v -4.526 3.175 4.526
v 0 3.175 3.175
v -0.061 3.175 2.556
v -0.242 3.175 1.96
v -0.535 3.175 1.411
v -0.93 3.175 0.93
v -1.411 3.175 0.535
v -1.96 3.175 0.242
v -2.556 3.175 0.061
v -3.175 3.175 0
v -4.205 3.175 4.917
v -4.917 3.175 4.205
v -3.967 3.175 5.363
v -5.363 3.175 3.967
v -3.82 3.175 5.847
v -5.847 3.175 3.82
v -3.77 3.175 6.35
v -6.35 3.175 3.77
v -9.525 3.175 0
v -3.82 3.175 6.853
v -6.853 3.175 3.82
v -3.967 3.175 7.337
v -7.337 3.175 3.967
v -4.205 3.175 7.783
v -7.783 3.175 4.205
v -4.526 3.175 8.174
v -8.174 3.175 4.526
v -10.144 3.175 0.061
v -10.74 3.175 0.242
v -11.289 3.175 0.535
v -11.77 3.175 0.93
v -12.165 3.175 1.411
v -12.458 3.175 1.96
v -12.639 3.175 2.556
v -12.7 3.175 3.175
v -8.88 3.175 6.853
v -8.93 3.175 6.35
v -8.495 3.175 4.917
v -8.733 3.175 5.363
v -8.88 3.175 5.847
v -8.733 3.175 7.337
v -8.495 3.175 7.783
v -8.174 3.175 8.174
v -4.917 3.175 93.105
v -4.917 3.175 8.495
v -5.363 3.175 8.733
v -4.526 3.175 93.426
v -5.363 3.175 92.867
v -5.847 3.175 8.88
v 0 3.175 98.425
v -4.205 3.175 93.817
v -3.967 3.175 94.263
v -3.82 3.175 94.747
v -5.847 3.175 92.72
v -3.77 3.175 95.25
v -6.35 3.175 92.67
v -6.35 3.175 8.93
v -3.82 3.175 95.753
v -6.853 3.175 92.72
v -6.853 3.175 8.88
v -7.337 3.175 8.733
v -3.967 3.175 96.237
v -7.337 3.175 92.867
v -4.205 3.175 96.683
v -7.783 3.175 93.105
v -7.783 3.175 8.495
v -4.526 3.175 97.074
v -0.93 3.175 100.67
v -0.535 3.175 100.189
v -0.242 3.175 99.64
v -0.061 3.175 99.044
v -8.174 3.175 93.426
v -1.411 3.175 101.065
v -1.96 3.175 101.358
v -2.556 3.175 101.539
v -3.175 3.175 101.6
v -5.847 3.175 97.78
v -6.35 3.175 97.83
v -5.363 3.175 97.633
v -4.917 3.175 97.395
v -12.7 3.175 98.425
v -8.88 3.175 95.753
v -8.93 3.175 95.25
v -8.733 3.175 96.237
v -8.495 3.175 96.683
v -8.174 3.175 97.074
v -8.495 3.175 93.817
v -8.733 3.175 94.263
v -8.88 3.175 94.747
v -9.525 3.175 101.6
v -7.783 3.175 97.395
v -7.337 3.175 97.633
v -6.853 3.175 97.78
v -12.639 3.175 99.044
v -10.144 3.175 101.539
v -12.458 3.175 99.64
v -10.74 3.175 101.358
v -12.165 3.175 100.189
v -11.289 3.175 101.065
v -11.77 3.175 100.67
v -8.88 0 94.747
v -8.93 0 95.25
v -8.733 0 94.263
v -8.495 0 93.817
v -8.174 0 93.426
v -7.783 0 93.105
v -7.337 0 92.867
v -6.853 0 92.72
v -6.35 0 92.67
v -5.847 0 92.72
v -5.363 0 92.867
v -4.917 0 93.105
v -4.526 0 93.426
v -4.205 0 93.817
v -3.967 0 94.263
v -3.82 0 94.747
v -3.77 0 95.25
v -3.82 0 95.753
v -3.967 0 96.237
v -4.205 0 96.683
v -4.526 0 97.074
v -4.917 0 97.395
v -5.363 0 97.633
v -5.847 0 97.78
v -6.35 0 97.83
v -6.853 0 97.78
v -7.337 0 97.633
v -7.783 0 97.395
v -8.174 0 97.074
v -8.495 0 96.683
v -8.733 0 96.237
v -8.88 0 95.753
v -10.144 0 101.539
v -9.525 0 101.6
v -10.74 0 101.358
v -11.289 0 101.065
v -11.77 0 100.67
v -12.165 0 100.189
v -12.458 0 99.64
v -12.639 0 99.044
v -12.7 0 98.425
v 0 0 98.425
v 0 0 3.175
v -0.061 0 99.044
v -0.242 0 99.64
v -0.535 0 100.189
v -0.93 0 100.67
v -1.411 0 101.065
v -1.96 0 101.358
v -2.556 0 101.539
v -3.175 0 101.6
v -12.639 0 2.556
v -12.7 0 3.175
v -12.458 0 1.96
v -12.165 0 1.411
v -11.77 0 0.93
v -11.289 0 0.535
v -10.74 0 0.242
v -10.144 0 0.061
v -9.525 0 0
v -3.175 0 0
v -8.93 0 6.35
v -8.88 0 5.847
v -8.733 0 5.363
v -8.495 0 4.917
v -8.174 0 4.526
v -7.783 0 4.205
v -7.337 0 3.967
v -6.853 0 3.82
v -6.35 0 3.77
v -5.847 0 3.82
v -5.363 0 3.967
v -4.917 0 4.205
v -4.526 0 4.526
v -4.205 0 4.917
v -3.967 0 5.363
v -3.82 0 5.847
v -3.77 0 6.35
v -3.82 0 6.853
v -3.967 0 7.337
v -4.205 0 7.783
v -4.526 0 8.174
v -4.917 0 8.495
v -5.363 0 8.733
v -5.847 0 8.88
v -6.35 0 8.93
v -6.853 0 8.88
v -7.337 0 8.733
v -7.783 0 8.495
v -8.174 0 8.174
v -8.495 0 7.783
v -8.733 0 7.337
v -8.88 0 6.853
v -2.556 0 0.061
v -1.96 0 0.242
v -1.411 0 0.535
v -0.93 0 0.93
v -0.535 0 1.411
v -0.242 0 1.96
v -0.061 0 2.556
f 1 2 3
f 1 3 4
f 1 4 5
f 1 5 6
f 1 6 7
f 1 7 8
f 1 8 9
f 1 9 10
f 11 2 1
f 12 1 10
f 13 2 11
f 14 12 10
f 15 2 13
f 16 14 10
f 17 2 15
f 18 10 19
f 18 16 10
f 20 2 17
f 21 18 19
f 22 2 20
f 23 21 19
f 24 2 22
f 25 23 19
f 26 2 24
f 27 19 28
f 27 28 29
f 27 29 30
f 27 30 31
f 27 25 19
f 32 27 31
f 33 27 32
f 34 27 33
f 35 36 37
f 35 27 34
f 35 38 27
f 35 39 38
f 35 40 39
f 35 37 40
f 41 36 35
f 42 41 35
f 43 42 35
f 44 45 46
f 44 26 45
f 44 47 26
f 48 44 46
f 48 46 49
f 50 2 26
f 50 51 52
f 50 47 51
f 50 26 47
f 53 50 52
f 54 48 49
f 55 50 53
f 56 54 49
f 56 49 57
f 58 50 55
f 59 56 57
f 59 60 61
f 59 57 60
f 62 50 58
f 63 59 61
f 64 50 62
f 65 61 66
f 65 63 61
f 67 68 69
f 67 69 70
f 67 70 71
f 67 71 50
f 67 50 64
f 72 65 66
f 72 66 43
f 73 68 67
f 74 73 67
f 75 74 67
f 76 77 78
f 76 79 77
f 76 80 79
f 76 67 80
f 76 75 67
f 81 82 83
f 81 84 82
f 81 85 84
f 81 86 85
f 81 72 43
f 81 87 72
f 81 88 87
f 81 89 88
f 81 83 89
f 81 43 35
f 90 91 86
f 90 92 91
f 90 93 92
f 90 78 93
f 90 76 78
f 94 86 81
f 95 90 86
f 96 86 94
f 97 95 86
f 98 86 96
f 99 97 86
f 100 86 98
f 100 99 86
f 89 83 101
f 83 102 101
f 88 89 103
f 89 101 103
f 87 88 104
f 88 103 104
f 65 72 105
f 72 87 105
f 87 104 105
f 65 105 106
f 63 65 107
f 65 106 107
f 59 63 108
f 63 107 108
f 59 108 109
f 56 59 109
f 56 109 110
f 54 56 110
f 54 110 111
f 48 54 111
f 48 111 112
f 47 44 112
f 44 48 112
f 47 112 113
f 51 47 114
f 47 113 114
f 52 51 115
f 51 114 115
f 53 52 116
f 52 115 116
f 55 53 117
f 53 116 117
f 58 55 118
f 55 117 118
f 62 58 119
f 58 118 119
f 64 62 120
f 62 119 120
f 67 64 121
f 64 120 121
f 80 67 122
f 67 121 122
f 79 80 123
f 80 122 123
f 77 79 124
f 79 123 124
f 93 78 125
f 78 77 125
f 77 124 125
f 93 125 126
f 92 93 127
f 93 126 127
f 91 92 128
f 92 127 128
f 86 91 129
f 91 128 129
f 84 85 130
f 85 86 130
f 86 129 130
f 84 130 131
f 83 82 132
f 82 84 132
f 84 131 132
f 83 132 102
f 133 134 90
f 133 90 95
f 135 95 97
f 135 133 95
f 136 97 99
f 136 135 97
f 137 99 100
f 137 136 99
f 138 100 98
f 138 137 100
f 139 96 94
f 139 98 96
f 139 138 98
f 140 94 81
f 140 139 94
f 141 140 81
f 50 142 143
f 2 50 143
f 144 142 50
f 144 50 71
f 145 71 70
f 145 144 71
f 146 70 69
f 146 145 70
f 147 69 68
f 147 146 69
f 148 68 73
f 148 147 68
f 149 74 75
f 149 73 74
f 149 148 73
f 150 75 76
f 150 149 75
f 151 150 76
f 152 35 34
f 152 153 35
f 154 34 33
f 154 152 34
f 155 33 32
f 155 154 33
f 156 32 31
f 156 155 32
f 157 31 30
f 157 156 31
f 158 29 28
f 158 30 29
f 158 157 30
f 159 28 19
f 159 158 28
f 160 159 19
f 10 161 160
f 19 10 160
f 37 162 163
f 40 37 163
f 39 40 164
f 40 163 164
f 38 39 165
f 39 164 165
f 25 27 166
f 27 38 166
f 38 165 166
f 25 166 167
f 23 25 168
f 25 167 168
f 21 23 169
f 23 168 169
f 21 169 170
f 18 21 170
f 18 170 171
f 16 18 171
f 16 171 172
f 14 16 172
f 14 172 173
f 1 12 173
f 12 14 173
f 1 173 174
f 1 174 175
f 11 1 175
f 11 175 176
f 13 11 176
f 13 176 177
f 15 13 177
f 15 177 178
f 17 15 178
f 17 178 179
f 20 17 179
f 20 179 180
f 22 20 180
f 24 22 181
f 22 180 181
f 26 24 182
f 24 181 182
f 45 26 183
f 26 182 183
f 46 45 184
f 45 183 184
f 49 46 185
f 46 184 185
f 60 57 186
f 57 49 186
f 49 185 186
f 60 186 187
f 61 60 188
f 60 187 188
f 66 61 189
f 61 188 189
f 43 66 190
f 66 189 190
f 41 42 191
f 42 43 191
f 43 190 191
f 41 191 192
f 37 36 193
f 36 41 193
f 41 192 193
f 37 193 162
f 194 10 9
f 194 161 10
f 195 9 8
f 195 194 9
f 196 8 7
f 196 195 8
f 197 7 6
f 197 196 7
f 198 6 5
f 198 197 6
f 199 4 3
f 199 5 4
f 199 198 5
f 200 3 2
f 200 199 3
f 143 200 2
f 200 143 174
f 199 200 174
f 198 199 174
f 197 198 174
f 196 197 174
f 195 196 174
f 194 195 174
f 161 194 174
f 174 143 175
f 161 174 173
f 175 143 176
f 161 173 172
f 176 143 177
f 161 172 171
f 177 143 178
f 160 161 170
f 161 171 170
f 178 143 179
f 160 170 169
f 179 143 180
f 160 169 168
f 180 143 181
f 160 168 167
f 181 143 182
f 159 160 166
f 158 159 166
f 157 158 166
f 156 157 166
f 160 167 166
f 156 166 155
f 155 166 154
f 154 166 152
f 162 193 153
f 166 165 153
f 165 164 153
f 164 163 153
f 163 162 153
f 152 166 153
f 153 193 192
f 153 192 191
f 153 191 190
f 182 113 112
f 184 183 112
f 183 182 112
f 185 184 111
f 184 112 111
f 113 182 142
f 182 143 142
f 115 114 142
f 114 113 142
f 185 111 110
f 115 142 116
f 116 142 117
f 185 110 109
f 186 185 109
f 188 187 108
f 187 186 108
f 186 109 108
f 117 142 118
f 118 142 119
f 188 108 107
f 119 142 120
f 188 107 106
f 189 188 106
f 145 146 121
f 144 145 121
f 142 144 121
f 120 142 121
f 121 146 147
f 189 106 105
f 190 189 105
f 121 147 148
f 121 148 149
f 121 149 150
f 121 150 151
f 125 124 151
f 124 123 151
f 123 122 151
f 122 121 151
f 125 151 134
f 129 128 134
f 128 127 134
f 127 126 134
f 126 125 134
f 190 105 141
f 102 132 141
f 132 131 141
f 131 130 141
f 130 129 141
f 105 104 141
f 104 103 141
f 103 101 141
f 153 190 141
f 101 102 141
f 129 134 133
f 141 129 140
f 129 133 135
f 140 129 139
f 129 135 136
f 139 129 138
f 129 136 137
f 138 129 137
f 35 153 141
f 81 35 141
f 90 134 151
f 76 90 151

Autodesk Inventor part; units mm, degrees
ref_plane "YZ Plane" through (0, 0, 0) normal (1, 0, 0) x (0, 1, 0)
ref_plane "XZ Plane" through (0, 0, 0) normal (0, 1, 0) x (-1, 0, 0)
ref_plane "XY Plane" through (0, 0, 0) normal (0, 0, 1) x (1, 0, 0)
sketch "Sketch1" plane through (0, 0, 0) normal (0, 1, 0) x (-1, 0, 0)
  line L0 (3.175, 0) -> (9.525, 0)
  line L1 (12.7, 3.175) -> (12.7, 98.425)
  line L2 (9.525, 101.6) -> (3.175, 101.6)
  line L3 (0, 98.425) -> (0, 3.175)
  circle A0 centre (6.35, 95.25) radius 2.5797
  circle A1 centre (6.35, 6.35) radius 2.5797
  arc A2 (12.7, 98.425) -> (9.525, 101.6) centre (9.525, 98.425) ccw
  arc A3 (3.175, 101.6) -> (0, 98.425) centre (3.175, 98.425) ccw
  arc A4 (0, 3.175) -> (3.175, 0) centre (3.175, 3.175) ccw
  arc A5 (9.525, 0) -> (12.7, 3.175) centre (9.525, 3.175) ccw
  point P0 (0, 0)
  point P1 (12.7, 101.6)
  point P2 (0, 101.6)
  dimension "d0" = 12.7
  dimension "d1" = 101.6
  dimension "d2" = 6.35
  dimension "d3" = 6.35
  dimension "d4" = 6.35
  dimension "d5" = 6.35
  dimension "d6" = 5.1594
  dimension "d7" = 3.175
extrude "Extrusion1" add sketch "Sketch1" along normal blind 3.175
equation "\"d2\" = 0.5 * d0"
equation "\"d3\" = d2"
equation "\"d4\" = d3"
equation "\"d5\" = d4"
properties part number "Pusher"
